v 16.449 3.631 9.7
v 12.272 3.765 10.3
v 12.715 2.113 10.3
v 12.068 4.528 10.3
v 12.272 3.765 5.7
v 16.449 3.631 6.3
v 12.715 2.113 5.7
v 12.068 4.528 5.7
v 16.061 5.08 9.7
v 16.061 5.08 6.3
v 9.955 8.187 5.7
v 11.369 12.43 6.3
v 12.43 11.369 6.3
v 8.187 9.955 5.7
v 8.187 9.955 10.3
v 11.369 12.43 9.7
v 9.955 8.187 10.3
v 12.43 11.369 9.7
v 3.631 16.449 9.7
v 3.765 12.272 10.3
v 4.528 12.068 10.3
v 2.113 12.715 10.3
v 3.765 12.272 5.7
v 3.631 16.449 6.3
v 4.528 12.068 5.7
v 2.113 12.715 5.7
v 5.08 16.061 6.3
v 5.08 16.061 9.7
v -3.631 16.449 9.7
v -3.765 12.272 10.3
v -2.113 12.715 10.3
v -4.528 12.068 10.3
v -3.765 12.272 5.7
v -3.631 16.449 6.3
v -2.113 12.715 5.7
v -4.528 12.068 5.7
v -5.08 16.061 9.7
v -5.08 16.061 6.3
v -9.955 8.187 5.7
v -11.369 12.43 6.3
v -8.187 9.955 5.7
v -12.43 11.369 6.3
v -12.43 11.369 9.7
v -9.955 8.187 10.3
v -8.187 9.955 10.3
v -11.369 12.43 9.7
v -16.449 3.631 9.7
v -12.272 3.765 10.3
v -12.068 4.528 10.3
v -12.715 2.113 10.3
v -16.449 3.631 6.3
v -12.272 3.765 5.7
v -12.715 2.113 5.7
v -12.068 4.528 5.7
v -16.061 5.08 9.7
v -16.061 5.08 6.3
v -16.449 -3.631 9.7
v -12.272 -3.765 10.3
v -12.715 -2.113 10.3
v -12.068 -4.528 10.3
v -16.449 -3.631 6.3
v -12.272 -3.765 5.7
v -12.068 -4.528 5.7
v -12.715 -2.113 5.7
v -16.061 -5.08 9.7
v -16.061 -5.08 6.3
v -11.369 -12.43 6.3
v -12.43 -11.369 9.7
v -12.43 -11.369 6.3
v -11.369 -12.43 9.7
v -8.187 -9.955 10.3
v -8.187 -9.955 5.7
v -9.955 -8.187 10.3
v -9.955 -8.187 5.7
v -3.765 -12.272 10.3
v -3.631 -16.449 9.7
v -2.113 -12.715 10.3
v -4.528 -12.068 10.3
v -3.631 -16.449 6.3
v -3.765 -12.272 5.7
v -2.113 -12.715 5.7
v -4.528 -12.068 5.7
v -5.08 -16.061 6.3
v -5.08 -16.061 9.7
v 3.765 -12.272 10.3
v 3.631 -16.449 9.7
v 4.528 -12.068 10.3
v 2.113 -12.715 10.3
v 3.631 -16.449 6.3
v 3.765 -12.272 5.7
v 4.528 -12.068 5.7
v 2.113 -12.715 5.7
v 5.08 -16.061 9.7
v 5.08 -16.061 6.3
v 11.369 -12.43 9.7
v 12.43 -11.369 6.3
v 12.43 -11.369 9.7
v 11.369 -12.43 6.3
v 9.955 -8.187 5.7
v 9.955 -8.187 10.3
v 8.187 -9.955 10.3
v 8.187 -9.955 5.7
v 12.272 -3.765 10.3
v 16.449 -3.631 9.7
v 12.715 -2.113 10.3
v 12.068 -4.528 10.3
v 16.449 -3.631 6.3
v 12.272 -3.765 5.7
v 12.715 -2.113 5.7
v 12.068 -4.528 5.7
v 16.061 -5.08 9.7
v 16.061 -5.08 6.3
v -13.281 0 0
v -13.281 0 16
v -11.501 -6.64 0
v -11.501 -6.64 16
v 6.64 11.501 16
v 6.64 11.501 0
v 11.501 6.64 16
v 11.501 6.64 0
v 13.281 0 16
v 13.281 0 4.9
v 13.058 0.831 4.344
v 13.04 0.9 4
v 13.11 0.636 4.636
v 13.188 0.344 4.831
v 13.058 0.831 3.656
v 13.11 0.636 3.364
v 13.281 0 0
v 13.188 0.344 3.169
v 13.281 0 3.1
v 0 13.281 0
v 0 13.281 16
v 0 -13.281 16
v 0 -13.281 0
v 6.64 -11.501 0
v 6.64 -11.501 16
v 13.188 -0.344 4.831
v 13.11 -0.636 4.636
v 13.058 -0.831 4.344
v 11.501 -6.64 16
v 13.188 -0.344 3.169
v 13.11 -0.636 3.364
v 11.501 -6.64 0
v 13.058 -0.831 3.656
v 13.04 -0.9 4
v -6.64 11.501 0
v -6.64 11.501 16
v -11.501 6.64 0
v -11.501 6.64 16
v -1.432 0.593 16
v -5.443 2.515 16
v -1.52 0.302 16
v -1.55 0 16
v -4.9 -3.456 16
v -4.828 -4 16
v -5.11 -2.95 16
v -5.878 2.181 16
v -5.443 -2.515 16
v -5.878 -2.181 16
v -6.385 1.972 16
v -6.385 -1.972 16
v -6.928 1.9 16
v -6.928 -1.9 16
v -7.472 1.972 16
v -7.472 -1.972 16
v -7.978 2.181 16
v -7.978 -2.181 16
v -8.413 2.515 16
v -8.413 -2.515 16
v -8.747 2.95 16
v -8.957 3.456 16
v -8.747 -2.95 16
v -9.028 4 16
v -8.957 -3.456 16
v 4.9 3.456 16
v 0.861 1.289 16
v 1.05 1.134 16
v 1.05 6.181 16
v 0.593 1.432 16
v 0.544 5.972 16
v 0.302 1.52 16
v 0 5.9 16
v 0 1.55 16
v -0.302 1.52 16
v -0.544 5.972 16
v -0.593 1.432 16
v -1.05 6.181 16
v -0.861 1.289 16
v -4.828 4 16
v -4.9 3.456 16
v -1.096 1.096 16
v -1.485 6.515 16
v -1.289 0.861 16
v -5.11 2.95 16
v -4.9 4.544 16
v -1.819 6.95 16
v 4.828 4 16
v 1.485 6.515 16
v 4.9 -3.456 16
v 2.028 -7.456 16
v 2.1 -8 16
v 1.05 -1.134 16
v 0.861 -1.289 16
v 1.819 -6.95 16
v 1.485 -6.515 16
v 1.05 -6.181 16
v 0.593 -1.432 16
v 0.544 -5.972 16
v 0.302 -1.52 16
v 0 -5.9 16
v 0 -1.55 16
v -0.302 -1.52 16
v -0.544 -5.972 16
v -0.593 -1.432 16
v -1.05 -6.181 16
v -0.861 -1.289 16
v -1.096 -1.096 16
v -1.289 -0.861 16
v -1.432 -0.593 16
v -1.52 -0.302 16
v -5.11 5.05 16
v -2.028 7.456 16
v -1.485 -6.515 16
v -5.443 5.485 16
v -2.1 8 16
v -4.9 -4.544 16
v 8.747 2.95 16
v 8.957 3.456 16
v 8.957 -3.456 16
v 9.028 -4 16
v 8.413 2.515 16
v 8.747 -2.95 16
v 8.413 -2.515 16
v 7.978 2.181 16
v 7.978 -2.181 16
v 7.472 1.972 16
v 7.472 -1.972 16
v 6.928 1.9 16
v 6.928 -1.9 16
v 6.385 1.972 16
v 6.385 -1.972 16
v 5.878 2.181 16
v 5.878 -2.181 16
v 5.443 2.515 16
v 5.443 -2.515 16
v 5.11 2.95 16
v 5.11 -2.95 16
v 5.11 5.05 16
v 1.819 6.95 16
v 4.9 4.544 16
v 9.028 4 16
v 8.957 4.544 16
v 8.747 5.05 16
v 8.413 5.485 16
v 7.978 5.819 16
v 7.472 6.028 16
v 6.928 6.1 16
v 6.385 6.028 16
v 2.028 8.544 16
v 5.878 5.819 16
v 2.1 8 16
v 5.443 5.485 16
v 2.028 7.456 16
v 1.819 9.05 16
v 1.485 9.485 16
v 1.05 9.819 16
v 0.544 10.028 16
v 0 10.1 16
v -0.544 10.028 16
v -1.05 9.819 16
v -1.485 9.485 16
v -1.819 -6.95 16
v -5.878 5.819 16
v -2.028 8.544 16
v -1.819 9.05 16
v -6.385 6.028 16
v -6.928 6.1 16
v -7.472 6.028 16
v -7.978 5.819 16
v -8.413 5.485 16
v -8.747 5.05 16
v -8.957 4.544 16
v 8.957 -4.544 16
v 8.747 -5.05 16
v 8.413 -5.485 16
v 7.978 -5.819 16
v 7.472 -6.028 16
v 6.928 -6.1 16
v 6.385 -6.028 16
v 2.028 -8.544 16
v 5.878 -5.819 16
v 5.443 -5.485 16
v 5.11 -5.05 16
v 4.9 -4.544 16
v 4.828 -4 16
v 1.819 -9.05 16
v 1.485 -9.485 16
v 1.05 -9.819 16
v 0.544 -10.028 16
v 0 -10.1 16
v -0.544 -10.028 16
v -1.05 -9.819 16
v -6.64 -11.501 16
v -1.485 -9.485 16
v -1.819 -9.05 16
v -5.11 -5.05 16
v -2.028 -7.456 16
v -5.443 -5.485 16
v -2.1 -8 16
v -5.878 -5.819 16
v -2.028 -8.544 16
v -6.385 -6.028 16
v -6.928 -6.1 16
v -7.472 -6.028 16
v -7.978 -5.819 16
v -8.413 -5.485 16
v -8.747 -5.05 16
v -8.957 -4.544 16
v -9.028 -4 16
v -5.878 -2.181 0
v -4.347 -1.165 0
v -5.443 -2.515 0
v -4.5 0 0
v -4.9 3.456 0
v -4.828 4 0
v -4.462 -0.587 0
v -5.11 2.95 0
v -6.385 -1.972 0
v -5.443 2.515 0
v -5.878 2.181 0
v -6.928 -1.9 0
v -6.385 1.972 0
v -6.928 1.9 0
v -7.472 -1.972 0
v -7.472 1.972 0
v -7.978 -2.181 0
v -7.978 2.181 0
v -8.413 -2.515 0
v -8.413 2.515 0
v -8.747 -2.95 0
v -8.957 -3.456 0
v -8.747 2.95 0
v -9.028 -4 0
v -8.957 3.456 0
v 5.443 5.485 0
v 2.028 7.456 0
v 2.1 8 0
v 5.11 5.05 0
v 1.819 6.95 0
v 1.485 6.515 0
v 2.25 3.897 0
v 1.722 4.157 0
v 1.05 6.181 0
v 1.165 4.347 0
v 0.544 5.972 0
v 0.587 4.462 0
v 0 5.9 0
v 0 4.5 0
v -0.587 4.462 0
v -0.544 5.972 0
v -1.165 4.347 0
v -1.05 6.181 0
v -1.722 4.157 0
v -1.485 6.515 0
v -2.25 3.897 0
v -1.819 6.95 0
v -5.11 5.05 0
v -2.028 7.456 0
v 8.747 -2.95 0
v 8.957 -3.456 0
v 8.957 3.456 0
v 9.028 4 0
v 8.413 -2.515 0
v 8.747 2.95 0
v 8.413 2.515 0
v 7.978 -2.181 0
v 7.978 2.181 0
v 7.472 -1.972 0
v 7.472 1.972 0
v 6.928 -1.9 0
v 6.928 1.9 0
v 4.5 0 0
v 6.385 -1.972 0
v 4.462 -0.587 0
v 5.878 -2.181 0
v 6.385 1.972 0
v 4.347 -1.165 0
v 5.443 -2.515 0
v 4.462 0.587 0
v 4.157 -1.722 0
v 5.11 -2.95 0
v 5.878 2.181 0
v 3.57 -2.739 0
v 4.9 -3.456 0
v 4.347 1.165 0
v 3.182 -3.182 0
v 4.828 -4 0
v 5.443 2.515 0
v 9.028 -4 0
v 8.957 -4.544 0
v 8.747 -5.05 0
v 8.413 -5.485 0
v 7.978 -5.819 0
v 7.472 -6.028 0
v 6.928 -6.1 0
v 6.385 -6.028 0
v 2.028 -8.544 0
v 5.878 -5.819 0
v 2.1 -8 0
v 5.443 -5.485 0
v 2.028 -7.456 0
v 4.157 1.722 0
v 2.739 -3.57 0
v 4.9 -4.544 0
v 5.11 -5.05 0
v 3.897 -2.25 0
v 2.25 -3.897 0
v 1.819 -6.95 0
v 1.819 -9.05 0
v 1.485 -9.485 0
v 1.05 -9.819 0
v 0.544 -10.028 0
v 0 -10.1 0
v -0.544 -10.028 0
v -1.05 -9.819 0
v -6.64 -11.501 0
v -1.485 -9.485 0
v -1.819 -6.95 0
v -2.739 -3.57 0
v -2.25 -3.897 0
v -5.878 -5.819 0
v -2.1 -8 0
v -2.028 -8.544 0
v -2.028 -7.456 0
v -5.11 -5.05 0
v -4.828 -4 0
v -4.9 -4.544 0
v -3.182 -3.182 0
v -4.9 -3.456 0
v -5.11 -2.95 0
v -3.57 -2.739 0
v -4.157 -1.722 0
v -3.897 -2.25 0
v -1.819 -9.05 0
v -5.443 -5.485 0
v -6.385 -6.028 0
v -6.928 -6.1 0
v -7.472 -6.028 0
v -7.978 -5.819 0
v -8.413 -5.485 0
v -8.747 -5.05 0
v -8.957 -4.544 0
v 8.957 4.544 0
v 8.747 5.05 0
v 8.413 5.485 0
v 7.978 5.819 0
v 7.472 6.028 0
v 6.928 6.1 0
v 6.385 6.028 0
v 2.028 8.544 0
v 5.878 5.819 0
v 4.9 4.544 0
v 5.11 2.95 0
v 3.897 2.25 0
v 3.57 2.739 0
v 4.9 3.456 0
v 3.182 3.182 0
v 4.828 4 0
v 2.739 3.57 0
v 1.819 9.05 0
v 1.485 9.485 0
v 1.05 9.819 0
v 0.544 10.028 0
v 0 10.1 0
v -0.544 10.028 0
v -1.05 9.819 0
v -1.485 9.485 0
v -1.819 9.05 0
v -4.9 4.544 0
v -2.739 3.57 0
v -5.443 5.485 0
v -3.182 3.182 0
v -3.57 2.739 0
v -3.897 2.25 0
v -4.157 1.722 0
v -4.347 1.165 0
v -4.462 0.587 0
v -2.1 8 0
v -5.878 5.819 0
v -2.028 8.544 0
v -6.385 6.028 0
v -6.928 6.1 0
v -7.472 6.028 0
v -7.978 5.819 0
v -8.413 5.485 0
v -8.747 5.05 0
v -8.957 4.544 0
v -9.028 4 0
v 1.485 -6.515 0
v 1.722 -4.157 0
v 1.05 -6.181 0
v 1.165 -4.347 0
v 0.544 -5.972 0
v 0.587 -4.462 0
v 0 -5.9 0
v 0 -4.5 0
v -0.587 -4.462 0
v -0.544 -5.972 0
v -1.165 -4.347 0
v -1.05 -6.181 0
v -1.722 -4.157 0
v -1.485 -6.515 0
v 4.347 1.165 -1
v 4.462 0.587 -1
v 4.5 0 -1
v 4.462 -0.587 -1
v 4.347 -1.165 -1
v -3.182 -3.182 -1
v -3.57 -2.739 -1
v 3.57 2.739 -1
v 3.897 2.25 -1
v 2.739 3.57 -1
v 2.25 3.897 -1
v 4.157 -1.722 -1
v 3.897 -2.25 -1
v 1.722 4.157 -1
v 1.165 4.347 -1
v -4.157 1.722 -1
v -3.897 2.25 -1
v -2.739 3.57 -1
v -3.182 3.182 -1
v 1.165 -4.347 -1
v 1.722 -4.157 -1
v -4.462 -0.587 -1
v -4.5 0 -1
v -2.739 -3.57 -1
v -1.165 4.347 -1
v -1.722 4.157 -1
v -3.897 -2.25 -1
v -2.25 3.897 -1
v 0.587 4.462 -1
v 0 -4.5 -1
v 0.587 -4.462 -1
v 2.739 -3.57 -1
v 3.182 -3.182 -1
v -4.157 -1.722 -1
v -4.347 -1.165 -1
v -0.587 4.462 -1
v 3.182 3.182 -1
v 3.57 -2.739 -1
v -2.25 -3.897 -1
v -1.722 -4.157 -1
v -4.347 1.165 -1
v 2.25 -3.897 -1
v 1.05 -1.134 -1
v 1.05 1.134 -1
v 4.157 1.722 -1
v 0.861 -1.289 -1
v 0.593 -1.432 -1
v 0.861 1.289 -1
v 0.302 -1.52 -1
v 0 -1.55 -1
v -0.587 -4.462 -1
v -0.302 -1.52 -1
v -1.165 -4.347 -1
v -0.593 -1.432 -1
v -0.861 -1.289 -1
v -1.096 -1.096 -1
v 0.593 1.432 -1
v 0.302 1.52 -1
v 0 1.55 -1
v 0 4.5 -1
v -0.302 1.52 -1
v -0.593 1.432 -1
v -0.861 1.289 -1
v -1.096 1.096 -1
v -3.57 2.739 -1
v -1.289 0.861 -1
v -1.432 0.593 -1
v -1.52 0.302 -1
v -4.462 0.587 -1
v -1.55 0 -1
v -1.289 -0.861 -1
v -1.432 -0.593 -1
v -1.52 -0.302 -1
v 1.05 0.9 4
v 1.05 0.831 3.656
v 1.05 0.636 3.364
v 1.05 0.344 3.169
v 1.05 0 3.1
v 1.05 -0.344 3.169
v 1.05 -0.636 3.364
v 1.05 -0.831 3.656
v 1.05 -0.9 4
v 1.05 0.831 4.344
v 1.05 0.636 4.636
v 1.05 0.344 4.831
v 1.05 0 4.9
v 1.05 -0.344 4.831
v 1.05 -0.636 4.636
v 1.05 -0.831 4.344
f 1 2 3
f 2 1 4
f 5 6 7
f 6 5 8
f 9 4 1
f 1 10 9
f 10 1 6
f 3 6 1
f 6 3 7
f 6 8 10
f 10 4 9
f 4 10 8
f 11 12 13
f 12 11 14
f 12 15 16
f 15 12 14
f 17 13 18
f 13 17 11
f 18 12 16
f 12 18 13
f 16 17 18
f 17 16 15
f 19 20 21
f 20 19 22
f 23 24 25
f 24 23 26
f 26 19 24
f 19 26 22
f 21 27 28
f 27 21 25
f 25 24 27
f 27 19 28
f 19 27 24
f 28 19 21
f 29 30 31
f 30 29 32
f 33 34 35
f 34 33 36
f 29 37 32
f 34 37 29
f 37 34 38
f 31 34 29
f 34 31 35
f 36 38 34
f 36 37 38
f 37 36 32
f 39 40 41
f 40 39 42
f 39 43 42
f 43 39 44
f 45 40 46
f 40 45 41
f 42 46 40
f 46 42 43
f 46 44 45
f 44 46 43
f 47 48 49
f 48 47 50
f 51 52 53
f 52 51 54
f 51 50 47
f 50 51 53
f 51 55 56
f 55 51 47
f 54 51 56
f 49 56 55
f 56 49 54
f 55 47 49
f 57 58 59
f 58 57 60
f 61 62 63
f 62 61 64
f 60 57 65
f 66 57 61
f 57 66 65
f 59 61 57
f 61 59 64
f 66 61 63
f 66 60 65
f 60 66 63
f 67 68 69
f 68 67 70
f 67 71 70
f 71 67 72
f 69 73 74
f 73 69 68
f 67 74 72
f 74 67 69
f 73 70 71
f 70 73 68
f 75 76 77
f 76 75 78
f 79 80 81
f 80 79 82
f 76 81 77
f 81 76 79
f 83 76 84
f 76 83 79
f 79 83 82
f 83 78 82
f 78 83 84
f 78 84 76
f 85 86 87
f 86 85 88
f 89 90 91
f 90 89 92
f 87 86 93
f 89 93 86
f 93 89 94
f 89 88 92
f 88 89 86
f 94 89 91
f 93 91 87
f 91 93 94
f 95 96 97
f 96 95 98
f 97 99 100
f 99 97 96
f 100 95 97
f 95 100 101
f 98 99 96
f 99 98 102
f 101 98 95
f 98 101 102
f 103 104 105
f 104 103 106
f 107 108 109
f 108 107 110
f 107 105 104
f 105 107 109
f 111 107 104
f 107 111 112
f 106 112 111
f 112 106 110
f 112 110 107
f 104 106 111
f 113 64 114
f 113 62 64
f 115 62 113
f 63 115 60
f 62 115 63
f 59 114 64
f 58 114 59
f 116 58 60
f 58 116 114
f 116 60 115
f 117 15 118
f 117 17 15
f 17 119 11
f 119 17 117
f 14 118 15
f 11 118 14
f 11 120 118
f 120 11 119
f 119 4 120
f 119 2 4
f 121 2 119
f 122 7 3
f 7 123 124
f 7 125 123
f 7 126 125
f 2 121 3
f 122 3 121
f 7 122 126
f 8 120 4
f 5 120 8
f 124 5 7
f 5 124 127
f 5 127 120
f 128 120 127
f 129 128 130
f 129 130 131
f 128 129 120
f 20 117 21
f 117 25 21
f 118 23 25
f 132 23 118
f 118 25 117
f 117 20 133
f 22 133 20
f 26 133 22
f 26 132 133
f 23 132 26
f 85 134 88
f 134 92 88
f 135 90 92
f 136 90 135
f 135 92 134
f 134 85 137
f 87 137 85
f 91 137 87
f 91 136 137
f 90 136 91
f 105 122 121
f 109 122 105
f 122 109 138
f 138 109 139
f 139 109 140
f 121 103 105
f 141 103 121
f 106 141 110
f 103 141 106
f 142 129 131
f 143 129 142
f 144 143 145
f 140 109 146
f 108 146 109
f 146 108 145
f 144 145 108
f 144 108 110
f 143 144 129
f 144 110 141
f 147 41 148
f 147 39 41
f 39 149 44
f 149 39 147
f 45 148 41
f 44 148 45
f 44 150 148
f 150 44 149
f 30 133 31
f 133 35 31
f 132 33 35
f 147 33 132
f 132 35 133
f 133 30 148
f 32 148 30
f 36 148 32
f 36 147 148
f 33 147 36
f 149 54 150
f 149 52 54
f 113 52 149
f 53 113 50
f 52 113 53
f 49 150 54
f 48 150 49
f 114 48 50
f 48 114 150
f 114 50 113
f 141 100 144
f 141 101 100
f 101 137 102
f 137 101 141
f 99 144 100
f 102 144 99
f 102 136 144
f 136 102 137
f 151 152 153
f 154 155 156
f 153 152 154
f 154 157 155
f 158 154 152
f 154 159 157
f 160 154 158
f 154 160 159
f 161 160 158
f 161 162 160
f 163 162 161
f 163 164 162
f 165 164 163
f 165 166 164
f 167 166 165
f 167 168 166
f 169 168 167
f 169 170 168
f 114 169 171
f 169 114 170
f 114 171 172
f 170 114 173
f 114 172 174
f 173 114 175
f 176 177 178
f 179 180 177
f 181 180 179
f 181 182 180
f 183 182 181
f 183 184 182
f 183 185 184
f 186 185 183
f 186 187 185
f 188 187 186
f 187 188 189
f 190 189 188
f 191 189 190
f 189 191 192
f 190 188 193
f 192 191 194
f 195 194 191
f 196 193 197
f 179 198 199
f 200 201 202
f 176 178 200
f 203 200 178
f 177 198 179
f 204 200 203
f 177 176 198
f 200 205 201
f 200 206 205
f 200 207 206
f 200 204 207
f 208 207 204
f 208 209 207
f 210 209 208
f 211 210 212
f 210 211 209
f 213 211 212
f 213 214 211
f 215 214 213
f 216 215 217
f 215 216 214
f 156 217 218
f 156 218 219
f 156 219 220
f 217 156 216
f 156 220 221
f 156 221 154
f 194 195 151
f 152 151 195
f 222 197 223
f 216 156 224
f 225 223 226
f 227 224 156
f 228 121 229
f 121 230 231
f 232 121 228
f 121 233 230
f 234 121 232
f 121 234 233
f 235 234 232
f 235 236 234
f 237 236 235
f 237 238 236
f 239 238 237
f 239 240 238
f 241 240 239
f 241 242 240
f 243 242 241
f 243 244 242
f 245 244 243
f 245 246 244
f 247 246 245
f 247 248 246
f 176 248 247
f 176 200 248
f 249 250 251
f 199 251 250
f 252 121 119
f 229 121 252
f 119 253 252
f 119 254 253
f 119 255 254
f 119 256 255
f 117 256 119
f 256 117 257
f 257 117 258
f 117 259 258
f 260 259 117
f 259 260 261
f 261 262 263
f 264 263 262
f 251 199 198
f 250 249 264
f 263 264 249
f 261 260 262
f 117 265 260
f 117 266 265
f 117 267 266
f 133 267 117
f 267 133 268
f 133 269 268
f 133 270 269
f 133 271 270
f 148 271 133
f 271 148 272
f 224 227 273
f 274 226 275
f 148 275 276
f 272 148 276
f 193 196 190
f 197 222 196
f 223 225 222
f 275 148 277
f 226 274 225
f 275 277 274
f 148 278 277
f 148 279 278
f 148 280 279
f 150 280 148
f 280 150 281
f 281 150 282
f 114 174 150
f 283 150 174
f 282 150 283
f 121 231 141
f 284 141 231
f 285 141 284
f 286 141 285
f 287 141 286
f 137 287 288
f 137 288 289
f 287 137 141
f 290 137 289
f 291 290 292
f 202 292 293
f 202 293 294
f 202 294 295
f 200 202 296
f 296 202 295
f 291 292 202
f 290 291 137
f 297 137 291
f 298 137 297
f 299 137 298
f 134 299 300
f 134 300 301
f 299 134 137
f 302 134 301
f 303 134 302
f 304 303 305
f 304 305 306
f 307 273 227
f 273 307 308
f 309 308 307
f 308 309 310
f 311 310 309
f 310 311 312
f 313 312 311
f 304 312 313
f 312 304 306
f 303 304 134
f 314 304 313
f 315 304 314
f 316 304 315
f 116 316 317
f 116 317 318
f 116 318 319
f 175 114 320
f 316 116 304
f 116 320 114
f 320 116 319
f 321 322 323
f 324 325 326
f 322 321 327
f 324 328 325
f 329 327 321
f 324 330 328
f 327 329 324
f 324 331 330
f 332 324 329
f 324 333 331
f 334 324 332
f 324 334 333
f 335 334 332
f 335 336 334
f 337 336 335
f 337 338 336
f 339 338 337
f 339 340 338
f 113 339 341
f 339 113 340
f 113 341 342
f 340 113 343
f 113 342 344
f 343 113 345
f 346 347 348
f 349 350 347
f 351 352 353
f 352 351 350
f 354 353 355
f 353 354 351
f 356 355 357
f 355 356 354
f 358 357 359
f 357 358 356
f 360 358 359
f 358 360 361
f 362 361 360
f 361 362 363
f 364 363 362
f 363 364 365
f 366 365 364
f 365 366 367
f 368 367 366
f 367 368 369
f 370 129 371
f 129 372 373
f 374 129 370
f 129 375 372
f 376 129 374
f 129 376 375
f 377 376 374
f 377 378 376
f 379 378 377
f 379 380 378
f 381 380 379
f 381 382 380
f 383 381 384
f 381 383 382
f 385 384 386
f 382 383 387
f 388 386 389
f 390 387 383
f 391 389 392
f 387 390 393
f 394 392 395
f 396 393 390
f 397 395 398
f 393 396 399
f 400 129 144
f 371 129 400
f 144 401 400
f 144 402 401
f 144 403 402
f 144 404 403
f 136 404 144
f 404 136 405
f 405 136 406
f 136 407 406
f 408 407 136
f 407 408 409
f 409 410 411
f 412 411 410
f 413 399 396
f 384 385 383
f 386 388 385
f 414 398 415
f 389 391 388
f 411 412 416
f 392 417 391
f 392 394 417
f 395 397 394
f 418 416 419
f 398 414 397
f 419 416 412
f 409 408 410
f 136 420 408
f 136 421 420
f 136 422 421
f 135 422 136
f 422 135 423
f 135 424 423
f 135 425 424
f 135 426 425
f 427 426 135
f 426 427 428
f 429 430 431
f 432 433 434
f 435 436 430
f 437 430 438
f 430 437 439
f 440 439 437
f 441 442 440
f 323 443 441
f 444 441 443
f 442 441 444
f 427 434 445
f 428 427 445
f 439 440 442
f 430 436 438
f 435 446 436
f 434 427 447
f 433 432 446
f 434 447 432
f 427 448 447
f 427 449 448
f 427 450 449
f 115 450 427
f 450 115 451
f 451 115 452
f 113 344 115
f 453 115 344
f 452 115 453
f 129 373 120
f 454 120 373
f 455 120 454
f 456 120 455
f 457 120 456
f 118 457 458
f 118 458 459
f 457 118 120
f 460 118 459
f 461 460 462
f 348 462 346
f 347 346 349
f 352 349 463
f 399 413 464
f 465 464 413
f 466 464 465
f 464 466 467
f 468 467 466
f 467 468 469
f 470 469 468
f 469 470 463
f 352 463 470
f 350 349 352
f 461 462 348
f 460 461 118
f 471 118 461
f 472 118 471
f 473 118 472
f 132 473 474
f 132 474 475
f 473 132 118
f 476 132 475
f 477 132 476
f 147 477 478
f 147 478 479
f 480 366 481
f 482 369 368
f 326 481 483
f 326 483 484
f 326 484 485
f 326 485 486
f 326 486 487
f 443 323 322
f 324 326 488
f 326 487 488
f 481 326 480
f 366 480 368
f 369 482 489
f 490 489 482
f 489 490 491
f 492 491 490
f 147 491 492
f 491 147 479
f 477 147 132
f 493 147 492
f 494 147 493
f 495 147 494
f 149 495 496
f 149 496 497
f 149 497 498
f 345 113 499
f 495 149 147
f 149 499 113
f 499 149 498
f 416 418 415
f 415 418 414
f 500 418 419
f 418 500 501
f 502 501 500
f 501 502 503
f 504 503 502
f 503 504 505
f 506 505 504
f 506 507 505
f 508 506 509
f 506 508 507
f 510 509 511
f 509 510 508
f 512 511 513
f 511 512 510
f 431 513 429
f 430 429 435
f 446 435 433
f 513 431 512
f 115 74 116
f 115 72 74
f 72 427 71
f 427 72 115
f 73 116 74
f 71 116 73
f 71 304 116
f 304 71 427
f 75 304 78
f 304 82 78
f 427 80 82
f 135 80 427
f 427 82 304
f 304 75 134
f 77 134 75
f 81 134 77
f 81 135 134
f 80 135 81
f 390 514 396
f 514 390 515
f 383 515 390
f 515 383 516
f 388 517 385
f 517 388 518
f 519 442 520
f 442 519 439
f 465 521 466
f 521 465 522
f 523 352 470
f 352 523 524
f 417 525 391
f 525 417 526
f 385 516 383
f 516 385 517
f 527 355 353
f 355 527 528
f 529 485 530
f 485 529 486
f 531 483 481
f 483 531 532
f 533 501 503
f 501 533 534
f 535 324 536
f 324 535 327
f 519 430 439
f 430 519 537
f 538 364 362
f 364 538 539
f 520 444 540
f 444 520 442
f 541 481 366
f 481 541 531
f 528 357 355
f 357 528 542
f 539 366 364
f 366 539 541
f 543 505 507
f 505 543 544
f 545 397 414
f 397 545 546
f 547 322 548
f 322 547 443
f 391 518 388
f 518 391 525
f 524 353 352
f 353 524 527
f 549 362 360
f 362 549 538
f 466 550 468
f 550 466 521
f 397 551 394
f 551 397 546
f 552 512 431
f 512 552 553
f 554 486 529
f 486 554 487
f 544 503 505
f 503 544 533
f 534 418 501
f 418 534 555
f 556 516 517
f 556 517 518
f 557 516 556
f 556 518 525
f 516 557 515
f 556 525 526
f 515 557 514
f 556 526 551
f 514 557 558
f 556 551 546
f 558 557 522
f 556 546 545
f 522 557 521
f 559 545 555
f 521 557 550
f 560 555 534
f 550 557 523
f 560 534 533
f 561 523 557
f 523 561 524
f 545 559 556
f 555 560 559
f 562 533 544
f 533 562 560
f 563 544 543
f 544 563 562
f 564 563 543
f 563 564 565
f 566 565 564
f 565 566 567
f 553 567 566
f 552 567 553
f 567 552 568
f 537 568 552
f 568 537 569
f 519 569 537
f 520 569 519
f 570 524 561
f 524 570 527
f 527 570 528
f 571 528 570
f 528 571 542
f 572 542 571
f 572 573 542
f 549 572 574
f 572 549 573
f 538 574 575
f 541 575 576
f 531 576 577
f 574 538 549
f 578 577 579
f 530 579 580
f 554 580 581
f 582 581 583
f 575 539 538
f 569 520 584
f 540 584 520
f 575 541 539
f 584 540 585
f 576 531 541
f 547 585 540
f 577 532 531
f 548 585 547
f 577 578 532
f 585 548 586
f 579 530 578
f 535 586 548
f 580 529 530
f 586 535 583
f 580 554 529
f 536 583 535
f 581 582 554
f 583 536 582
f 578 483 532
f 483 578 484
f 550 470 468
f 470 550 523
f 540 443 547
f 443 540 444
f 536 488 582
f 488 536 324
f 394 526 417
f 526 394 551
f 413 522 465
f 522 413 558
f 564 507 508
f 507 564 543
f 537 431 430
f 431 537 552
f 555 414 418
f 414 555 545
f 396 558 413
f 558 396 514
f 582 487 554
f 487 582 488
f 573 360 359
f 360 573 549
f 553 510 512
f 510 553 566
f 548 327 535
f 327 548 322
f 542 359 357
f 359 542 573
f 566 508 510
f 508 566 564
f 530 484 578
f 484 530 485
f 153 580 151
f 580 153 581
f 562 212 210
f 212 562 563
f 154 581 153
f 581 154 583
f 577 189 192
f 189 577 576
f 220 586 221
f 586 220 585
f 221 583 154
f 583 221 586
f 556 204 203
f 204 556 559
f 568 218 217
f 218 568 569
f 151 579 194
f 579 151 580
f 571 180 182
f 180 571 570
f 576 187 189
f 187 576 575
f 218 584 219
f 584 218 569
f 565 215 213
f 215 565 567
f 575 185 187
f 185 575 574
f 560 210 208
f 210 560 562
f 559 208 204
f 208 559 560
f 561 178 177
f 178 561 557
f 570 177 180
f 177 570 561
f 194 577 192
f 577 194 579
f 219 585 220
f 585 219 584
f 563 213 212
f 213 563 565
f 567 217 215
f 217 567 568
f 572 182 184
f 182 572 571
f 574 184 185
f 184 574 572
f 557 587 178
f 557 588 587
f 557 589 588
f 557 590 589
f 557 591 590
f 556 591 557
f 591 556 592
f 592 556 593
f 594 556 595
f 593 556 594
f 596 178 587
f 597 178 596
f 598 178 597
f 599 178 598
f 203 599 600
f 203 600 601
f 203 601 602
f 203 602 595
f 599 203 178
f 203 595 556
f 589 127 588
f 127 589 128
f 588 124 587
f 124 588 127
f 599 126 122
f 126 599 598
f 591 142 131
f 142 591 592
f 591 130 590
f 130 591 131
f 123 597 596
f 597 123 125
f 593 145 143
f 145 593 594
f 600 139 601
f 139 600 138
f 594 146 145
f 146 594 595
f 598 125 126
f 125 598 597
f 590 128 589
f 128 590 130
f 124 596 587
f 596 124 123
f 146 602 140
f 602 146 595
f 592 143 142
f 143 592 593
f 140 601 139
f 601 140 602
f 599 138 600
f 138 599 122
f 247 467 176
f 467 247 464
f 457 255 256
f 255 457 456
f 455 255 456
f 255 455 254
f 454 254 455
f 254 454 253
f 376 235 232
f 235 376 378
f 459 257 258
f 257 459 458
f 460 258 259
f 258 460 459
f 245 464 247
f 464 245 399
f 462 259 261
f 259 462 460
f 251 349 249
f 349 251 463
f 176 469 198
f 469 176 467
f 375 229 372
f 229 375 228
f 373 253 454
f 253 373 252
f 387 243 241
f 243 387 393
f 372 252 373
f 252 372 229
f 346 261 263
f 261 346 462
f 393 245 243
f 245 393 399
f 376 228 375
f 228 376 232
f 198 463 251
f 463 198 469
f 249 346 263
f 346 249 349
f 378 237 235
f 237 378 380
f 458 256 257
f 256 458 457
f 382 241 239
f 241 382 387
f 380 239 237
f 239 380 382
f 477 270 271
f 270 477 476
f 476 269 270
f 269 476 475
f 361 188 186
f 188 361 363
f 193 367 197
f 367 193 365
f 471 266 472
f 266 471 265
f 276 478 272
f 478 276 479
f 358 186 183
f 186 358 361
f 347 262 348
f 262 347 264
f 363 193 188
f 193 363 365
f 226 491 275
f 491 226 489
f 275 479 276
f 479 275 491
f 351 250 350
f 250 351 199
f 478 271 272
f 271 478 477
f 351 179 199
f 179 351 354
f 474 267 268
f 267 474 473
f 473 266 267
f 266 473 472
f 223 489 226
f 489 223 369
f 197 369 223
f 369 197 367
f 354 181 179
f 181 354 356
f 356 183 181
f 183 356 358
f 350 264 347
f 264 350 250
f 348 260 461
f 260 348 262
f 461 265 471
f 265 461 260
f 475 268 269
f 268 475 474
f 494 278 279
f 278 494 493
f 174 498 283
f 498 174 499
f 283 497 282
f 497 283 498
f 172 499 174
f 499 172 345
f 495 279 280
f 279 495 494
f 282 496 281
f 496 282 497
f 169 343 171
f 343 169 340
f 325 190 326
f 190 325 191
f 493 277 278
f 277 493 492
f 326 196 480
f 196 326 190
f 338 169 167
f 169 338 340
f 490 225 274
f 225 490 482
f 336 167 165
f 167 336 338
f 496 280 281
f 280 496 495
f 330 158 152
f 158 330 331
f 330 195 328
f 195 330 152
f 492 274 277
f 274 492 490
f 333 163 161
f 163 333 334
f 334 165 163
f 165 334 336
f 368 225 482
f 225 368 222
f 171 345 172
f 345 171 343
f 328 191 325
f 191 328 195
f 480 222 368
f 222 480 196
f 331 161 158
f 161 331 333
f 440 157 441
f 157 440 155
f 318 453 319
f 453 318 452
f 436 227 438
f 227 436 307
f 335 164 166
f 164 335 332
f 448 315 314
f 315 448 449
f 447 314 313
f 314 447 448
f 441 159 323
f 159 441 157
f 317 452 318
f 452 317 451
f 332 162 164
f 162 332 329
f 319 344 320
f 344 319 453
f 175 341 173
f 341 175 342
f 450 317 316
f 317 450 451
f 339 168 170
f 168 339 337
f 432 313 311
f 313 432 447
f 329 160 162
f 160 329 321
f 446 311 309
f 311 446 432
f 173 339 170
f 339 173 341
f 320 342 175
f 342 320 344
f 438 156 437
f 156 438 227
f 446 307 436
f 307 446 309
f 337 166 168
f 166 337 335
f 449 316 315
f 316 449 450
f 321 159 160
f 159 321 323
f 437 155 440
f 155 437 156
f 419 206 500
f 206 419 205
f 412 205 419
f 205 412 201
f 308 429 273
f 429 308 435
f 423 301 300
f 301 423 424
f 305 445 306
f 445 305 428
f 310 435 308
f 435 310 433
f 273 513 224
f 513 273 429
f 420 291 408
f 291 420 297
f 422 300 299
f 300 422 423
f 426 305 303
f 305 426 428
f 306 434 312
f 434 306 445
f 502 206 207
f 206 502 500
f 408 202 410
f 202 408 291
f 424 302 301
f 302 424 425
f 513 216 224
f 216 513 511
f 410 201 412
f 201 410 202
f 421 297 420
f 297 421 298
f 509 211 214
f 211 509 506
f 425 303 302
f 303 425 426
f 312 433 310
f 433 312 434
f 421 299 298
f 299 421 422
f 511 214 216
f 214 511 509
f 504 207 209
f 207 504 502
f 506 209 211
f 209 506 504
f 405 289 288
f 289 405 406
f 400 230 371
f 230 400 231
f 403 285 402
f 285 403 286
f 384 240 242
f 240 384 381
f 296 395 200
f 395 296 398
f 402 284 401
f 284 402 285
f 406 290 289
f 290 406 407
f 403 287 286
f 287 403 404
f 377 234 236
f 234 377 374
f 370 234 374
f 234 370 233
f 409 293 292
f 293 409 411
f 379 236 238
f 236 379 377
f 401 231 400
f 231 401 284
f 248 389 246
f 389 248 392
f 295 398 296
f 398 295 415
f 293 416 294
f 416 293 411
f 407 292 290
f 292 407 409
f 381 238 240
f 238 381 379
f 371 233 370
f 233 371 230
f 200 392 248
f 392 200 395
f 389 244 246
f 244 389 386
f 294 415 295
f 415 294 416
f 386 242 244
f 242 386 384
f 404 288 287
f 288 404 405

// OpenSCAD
// file: params.scad
// ===========================================================================
//  Cozmo replica - shared dimensions for every printed part
//  Units: mm.  Robot frame: x = forward, y = left, z = up, origin = ground
//  centre.  Change values here, then re-export with hardware/3d/export.sh.
// ===========================================================================

$fn = 48;
eps = 0.01;
clr = 0.25;            // general printing clearance

// ---------------------------------------------------------------- fasteners
m3_hole      = 3.3;    // clearance hole
m3_tap       = 2.6;    // self-tapping into plastic
m3_nut_af    = 5.7;    // nut across flats (+clearance)
m3_nut_h     = 2.6;
m2_tap       = 1.8;
pin_hole     = 1.95;   // 1.75 mm filament used as track pins

// ---------------------------------------------------------------- tracks
pitch        = 8;      // track link pitch
teeth        = 12;     // sprocket teeth = links wrapped per revolution
link_t       = 3.6;    // link thickness (= hinge barrel diameter)
link_w       = 16;     // link width
grouser_h    = 1.2;    // tread ridge height
r_pin        = (pitch / 2) / sin(180 / teeth);    // pin circle radius (15.45)
axle_z       = r_pin + link_t / 2 + grouser_h;    // axle height (18.45)
wheelbase    = 56;     // with 26 links per side: 2*56 + 12*8 = 208 = 26*8
links_per_side = 26;
axle_x_rear  = -wheelbase / 2;   // drive sprocket (motor)
axle_x_front =  wheelbase / 2;   // idler

// ---------------------------------------------------------------- chassis tub
wall         = 2;
tub_len      = 86;
tub_w        = 70;
tub_z0       = 8;      // ground clearance
tub_h        = 42;     // tub top at z = 50
tub_r        = 6;      // vertical corner radius
floor_t      = 2;
tub_top      = tub_z0 + tub_h;
track_y      = tub_w / 2 + 1 + link_w / 2;        // 44: track centre line

// ---------------------------------------------------------------- N20 motor
n20_w        = 12.2;   // gearbox width (z when mounted)
n20_h        = 10.2;   // gearbox height
n20_len      = 33;     // gearbox + motor + encoder
n20_shaft_d  = 3;
n20_shaft_flat = 2.5;  // D-shaft flat
n20_shaft_len = 10;

// ---------------------------------------------------------------- servos (SG90 / MG90S)
servo_l      = 23.0;   // body length
servo_w      = 12.6;   // body width
servo_h      = 22.8;   // body height (to tab underside ~15.9)
servo_tab_l  = 32.6;   // length over mounting tabs
servo_tab_t  = 2.6;
servo_tab_z  = 15.9;   // tab underside from body bottom
servo_shaft_off = 5.9; // output shaft centre from body end
servo_shaft_h = 28.5;  // body bottom to top of spline

// ---------------------------------------------------------------- OLED
// Default: 1.3" I2C module (SH1106). For a 0.96" module set oled_096 = true
// (and OLED_IS_SH1106 = false in firmware/include/config.h).
oled_096     = false;
oled_pcb     = oled_096 ? [27.4, 27.8] : [35.6, 33.8];  // w x h
oled_view    = oled_096 ? [23.0, 12.0] : [30.0, 15.4];  // visible window
oled_view_dz = oled_096 ? 3.6 : 2.6;   // window centre above PCB centre
oled_pcb_t   = 1.7;
oled_glass_t = 1.6;
oled_hole_d  = 2.2;
oled_hole_in = oled_096 ? 2.0 : 2.3;   // hole centre from PCB edges

// ---------------------------------------------------------------- head
head_w       = 56;     // y
head_d       = 36;     // x
head_h       = 44;     // z
head_r       = 7;
head_wall    = 1.8;
head_pivot   = [6, 0, 72];     // pivot axis position in robot frame
head_below   = 12;     // head bottom is this far below the pivot
cheek_t      = 3;

// ---------------------------------------------------------------- lift (parallel 4-bar)
lift_pivot_x = -25;
lift_pivot_lo_z = 59;
lift_pivot_hi_z = 71;
lift_link_len = 80;
lift_link_y  = 57.5;   // link centre plane (outside the tracks + servo horn)
lift_link_t  = 4;
lift_link_h  = 7;
carrier_drop = 28;     // carrier extends this far below the lower pin
fork_y       = 15;     // forks at +-fork_y
fork_len     = 16;

// ---------------------------------------------------------------- misc parts
battery      = [52, 36, 11];   // 1S LiPo 103450 bay (l, w, h)
speaker_d    = 28.5;           // 28 mm 8 ohm speaker
speaker_t    = 5;
switch_slot  = [8.8, 4.2];     // SS12D00 slide switch
usbc_slot    = [9.6, 3.8];     // TP4056 USB-C charging port
led_count    = 4;
led_pitch    = 7;              // WS2812 spacing on the backpack bar

// ---------------------------------------------------------------- helpers
module rounded_box(size, r, center = false) {
  // Box with rounded vertical edges.
  translate(center ? [-size[0] / 2, -size[1] / 2, -size[2] / 2] : [0, 0, 0])
    hull() for (x = [r, size[0] - r], y = [r, size[1] - r])
      translate([x, y, 0]) cylinder(r = r, h = size[2]);
}

module rounded_cube(size, r) {
  // Box with every edge rounded (centred).
  hull() for (x = [-1, 1], y = [-1, 1], z = [-1, 1])
    translate([x * (size[0] / 2 - r), y * (size[1] / 2 - r), z * (size[2] / 2 - r)])
      sphere(r = r, $fn = 24);
}

module hex_nut_pocket(h = m3_nut_h) {
  cylinder(d = m3_nut_af / cos(30), h = h, $fn = 6);
}
// main file
// ===========================================================================
//  Track wheels. drive = true: rear sprocket pressed on the N20 D-shaft.
//  drive = false: front idler spinning on an M3 screw.
//  Print 2 of each, flat side down, 100 % infill for the drive hub.
// ===========================================================================
include <params.scad>

drive = true;

hub_r_flat = r_pin * cos(180 / teeth) - link_t / 2 - 0.3;   // plate inner face
hub_r = hub_r_flat / cos(180 / teeth);                       // 12-gon circumradius
tooth = [2.5, 4.6];                                          // tangential, axial
tooth_h = link_t + 0.4;
width = link_w;

module tooth_shape() {
  // Tapered tooth from the hub flat outwards (along +x).
  hull() {
    translate([hub_r_flat - 0.5, -tooth[0] / 2, -tooth[1] / 2]) cube([0.5, tooth[0], tooth[1]]);
    translate([hub_r_flat + tooth_h - 0.4, -tooth[0] / 2 + 0.5, -tooth[1] / 2 + 0.6])
      cube([0.4, tooth[0] - 1.0, tooth[1] - 1.2]);
  }
}

module d_shaft_hole() {
  intersection() {
    cylinder(d = n20_shaft_d + 0.1, h = 40, center = true, $fn = 32);
    translate([-(n20_shaft_d + 1) / 2, -(n20_shaft_d + 1) / 2, -20])
      cube([n20_shaft_flat + 0.05 + (n20_shaft_d + 1) / 2 - n20_shaft_d / 2, n20_shaft_d + 1, 40]);
  }
}

module sprocket() {
  difference() {
    union() {
      // 12-sided hub: link plates sit on the flats
      rotate([0, 0, 0]) cylinder(r = hub_r, h = width, $fn = teeth);
      // Teeth centred on the flats, at mid-width
      for (i = [0 : teeth - 1])
        rotate([0, 0, 180 / teeth + i * 360 / teeth])
          translate([0, 0, width / 2]) tooth_shape();
      // Longer hub on the motor side for more shaft engagement
      if (drive) translate([0, 0, -1]) cylinder(d = 9, h = 1 + eps);
    }
    if (drive) {
      translate([0, 0, -1]) d_shaft_hole();
      // M2 grub screw / self-tapping screw onto the shaft flat
      translate([0, 0, 4]) rotate([0, 90, 0]) cylinder(d = m2_tap, h = hub_r + 1, $fn = 16);
    } else {
      translate([0, 0, -2]) cylinder(d = m3_hole + 0.1, h = width + 4);
    }
    // Lightening holes
    for (i = [0 : 5]) rotate([0, 0, i * 60 + 30])
      translate([8, 0, -1]) cylinder(d = 4.2, h = width + 2, $fn = 24);
  }
}

sprocket();
